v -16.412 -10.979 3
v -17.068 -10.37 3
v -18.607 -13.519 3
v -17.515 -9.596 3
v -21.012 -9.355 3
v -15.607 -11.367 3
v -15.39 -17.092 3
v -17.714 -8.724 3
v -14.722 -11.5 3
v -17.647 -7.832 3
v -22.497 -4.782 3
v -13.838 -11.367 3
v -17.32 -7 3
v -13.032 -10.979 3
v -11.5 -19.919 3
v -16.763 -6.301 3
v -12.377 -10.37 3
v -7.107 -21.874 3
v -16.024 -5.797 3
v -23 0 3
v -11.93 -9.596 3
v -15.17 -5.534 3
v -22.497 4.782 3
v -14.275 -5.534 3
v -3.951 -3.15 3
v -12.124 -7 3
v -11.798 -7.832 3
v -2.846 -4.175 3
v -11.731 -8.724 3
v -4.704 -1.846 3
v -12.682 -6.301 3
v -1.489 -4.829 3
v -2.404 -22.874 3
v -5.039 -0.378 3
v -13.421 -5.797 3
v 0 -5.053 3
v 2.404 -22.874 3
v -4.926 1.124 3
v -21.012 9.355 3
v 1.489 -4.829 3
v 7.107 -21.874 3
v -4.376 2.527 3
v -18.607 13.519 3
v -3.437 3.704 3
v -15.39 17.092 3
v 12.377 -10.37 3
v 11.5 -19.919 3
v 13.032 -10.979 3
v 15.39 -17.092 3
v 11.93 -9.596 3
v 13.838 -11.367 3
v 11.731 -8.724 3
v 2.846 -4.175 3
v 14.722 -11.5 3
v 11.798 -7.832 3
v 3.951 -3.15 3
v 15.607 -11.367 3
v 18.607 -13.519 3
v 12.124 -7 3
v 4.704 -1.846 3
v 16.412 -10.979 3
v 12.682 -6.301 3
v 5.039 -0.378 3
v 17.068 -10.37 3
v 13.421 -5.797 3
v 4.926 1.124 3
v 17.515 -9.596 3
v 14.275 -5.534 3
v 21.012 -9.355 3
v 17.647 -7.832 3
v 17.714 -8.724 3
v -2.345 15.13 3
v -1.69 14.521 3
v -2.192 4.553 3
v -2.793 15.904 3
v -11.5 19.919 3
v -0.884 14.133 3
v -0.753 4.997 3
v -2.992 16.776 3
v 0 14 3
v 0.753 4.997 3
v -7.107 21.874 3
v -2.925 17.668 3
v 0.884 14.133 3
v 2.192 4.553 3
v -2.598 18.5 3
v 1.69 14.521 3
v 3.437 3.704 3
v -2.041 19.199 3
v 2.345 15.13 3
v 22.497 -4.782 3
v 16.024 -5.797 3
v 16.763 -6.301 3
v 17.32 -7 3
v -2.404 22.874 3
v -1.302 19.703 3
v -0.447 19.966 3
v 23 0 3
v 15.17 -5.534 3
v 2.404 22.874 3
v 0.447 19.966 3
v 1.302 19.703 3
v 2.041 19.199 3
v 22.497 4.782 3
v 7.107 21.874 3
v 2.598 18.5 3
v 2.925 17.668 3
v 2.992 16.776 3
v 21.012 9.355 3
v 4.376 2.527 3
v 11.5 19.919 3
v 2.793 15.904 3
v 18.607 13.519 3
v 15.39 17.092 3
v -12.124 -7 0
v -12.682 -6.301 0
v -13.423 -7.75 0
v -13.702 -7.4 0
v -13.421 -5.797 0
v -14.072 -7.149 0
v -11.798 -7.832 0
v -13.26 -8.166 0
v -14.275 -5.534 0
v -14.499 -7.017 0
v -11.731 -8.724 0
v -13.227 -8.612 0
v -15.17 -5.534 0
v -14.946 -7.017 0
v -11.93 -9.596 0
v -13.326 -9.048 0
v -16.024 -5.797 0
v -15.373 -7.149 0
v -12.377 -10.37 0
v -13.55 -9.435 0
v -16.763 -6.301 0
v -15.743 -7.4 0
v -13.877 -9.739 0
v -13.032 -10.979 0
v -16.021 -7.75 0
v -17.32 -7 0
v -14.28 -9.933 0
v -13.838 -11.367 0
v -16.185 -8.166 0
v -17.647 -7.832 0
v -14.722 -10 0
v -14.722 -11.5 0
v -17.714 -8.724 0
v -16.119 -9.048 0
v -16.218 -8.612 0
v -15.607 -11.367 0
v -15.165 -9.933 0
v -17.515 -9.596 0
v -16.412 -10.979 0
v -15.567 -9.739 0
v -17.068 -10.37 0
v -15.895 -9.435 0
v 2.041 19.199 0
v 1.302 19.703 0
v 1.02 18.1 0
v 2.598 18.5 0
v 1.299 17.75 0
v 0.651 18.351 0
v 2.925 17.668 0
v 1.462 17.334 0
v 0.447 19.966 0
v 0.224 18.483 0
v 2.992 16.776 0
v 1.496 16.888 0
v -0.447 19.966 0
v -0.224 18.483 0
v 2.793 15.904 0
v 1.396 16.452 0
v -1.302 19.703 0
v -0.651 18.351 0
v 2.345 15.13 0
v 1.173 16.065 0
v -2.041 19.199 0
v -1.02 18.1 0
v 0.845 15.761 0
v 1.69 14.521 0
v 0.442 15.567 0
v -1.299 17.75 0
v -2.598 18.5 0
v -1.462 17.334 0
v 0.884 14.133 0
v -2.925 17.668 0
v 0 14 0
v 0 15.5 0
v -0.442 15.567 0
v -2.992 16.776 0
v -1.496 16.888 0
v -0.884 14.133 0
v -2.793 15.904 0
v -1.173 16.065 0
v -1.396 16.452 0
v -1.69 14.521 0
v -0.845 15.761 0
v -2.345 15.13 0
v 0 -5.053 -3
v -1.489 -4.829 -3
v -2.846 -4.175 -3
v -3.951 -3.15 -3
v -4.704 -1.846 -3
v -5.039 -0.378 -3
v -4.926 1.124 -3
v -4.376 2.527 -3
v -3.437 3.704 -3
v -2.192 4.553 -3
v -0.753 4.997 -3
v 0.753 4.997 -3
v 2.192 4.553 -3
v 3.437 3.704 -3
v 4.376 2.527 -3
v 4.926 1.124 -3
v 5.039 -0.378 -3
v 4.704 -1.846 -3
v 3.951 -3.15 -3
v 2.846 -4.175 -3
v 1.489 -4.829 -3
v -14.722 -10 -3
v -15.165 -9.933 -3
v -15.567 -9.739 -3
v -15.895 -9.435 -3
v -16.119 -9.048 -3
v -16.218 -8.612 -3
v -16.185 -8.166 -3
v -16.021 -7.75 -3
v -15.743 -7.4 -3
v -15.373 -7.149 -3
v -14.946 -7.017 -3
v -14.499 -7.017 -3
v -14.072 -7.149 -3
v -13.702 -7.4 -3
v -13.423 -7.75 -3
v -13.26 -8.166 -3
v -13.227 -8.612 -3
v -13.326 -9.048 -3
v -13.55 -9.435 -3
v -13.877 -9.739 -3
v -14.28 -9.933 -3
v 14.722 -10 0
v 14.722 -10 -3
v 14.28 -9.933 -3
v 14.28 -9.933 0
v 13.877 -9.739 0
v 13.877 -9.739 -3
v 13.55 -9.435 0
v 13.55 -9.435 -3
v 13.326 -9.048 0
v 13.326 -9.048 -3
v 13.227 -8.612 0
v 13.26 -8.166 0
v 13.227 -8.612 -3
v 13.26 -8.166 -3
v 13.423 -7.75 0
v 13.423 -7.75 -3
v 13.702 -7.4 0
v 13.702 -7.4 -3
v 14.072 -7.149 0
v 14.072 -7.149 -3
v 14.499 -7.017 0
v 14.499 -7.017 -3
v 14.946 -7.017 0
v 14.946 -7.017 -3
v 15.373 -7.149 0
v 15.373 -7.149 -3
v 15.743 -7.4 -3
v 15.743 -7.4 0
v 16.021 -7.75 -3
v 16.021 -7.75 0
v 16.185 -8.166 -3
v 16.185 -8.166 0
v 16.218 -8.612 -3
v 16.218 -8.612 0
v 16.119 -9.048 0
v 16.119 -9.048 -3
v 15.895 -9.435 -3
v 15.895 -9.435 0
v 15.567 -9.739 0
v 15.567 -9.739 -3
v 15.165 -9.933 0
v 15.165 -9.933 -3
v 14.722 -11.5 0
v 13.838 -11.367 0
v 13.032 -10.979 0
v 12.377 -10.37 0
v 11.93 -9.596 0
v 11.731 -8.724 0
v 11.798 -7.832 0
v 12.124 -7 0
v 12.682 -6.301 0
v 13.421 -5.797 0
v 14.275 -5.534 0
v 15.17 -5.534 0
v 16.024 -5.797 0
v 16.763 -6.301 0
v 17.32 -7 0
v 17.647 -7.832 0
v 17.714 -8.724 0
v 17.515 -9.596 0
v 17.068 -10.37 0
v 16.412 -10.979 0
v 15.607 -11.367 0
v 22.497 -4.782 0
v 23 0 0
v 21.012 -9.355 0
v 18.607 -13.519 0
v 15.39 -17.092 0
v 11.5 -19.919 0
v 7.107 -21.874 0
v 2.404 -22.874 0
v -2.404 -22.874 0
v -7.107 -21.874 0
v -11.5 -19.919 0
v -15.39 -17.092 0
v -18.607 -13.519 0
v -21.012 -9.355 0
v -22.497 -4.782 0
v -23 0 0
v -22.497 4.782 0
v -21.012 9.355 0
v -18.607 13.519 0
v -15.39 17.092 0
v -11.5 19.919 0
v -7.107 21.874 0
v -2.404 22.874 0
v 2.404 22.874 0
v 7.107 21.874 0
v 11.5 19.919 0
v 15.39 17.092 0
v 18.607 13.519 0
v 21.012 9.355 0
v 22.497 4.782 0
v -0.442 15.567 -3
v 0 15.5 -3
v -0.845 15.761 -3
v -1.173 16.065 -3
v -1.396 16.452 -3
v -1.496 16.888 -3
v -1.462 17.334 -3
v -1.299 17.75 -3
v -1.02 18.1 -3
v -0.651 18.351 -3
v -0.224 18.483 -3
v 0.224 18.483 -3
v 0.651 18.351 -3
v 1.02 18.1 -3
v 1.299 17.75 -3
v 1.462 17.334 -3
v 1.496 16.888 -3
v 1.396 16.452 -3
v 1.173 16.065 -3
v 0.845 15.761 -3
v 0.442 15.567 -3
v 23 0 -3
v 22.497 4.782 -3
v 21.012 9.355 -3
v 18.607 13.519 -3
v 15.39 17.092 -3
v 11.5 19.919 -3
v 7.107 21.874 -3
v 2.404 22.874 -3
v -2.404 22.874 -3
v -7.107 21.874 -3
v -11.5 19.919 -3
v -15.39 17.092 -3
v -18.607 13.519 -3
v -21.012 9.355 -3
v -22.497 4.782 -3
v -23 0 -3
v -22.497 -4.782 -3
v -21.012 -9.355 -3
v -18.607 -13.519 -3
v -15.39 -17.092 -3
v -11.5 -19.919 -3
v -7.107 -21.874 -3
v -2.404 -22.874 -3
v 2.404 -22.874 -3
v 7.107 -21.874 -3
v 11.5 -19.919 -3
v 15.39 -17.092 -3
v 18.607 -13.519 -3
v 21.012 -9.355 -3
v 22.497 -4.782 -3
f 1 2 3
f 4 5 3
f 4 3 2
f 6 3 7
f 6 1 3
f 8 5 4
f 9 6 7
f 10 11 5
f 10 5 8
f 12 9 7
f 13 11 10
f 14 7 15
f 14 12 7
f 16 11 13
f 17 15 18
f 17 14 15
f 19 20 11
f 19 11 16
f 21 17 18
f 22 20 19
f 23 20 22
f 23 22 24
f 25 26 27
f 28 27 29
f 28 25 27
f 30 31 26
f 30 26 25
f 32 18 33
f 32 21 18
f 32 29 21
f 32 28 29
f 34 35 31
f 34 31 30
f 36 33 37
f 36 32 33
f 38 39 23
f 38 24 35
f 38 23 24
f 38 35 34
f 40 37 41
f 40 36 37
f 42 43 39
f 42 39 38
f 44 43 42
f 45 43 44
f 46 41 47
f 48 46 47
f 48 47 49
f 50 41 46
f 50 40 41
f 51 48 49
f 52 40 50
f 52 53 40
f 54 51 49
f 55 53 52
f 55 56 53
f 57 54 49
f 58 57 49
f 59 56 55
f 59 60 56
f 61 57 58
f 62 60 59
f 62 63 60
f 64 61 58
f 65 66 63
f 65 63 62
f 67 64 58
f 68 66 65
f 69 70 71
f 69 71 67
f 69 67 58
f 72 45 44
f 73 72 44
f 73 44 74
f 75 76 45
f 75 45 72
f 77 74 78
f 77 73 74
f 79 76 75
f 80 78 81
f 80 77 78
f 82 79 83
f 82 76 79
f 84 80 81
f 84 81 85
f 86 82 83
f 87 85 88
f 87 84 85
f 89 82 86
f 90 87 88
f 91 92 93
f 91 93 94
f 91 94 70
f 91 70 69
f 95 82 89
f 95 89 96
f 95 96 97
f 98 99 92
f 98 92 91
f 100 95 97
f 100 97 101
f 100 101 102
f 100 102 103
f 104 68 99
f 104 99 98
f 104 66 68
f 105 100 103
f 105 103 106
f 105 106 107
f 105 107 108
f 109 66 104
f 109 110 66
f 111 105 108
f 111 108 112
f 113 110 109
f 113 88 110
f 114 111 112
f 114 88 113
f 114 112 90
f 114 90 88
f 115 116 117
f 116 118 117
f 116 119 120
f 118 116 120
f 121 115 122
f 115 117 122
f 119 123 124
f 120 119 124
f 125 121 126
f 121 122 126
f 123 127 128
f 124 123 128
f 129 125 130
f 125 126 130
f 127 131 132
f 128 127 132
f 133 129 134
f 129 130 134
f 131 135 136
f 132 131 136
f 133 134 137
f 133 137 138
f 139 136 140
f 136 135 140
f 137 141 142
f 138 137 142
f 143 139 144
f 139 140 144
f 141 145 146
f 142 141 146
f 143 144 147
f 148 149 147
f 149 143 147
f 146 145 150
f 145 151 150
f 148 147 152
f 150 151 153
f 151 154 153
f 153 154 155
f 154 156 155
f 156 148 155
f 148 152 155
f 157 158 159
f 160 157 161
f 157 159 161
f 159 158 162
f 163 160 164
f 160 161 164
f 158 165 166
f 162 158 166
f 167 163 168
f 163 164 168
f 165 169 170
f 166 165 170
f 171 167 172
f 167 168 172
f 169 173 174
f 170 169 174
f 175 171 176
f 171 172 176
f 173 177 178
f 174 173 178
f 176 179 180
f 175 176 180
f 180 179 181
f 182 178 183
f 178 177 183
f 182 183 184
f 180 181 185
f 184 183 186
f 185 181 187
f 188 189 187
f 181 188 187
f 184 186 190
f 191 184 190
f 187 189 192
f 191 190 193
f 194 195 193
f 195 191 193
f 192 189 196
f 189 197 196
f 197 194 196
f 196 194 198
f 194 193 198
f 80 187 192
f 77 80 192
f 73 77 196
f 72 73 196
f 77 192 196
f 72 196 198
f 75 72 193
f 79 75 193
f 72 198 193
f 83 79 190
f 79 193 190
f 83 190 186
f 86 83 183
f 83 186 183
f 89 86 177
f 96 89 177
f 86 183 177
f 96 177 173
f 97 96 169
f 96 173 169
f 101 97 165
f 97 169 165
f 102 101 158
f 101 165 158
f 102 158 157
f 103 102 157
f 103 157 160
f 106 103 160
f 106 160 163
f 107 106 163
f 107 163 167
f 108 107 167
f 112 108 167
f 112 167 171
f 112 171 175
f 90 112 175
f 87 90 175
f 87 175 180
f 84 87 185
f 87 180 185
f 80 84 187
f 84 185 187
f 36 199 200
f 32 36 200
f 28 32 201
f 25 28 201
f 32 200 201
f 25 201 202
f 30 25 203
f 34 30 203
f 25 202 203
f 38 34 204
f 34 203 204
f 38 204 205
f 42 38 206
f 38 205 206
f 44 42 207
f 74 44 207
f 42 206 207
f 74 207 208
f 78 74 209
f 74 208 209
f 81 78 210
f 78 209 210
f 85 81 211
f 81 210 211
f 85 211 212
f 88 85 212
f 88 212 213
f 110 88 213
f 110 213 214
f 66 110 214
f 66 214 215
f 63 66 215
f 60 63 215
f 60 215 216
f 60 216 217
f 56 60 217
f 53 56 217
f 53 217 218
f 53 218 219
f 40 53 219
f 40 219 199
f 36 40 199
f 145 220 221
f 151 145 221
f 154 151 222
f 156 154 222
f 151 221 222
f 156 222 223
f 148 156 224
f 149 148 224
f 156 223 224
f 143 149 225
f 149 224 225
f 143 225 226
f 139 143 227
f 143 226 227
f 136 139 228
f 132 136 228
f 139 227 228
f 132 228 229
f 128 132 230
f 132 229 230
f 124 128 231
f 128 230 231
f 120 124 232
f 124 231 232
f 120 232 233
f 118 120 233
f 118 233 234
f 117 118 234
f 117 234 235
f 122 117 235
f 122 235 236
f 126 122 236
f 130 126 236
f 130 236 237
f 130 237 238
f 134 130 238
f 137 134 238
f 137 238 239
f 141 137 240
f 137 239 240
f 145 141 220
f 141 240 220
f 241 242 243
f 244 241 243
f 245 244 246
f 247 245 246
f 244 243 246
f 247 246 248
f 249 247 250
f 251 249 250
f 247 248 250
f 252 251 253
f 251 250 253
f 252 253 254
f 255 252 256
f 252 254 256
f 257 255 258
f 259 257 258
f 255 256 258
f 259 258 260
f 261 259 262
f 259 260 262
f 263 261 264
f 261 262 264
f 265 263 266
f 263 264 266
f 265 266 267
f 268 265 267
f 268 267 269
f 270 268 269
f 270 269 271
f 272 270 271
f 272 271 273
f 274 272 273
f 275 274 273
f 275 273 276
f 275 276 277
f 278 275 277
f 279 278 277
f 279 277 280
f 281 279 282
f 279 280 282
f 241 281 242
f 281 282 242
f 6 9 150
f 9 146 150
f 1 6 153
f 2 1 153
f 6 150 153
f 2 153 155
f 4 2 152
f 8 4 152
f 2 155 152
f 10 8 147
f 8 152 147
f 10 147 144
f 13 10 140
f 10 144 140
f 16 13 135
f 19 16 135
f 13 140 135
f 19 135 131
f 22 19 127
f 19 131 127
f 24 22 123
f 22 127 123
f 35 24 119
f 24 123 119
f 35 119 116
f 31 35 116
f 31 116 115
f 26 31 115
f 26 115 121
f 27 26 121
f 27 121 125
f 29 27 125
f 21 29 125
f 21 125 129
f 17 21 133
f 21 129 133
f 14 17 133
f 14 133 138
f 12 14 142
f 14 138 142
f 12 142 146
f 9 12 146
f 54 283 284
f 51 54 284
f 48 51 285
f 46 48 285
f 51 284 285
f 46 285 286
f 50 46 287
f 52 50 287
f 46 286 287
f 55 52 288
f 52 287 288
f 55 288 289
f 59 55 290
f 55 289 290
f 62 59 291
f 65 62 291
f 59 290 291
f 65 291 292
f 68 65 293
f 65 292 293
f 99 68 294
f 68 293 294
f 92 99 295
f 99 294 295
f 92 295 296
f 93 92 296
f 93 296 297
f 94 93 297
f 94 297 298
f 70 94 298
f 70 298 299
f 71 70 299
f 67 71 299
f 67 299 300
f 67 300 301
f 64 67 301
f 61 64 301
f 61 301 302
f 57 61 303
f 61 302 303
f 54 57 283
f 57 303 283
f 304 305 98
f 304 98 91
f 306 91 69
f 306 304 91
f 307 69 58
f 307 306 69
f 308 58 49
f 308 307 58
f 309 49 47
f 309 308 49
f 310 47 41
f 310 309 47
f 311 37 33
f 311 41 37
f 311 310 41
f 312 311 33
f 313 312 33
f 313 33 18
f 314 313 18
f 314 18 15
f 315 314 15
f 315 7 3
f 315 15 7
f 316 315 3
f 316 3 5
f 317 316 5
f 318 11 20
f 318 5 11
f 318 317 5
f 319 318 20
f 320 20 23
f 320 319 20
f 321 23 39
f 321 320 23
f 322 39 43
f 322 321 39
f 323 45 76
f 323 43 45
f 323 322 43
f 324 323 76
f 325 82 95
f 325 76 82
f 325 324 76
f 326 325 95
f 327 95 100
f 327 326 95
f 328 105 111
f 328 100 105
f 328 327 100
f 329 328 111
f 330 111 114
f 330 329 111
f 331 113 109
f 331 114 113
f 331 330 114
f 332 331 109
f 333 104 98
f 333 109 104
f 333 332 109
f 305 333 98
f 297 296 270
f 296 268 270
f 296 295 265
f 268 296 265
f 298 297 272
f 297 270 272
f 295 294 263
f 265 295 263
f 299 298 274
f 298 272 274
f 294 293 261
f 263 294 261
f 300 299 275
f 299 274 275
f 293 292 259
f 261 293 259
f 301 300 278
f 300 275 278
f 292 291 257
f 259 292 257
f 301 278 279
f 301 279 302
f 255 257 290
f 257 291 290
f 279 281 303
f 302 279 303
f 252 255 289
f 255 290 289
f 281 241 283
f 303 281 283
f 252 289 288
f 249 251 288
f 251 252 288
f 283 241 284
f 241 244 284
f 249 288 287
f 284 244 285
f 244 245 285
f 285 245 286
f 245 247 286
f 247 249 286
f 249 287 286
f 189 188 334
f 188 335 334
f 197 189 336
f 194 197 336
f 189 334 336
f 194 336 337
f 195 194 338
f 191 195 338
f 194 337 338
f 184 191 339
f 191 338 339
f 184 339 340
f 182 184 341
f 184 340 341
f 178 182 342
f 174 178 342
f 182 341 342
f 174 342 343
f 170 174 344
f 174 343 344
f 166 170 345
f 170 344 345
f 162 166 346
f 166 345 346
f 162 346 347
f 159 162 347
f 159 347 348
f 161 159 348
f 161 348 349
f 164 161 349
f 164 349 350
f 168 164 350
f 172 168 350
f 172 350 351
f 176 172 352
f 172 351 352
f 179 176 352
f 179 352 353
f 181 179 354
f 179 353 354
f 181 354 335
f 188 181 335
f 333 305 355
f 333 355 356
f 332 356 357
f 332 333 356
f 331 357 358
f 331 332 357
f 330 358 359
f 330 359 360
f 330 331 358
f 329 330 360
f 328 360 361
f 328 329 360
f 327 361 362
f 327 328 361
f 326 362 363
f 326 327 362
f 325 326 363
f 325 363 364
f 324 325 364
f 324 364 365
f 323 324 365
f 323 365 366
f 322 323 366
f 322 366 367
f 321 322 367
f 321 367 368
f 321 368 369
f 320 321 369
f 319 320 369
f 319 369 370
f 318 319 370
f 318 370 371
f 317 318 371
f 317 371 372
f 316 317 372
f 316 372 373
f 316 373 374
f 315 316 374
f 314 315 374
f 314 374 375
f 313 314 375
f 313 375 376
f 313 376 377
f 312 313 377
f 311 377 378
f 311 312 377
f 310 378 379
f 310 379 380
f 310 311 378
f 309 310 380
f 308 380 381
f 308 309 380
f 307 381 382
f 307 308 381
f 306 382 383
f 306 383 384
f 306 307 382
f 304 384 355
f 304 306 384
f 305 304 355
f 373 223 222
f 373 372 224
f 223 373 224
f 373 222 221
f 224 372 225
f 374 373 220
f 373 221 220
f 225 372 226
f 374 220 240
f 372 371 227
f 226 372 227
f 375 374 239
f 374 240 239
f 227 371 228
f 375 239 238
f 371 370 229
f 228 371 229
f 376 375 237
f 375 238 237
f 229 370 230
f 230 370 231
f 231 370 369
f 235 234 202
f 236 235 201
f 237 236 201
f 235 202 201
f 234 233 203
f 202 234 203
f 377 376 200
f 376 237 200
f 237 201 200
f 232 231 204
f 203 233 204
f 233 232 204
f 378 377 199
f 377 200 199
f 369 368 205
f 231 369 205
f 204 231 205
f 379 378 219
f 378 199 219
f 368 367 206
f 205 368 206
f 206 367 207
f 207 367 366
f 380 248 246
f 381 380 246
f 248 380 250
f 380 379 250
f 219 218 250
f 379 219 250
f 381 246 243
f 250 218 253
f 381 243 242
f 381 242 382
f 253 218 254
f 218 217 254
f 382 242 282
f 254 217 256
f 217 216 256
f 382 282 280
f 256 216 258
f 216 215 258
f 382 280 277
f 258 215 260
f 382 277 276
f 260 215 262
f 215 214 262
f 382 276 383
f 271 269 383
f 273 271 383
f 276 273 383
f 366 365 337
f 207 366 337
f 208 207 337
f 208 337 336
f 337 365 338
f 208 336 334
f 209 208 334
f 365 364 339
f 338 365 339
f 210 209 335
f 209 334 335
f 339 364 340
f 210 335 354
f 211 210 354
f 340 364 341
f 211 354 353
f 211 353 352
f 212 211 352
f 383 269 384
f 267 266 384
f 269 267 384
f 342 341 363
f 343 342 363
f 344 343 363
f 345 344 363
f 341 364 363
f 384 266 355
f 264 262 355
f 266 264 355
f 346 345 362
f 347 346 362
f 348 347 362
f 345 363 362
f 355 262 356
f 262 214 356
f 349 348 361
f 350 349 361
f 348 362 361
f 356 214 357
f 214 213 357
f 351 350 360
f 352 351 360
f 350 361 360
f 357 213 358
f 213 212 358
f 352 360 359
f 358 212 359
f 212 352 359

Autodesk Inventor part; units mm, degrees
ref_plane "YZ Plane" through (0, 0, 0) normal (1, 0, 0) x (0, 1, 0)
ref_plane "XZ Plane" through (0, 0, 0) normal (0, 1, 0) x (-1, 0, 0)
ref_plane "XY Plane" through (0, 0, 0) normal (0, 0, 1) x (1, 0, 0)
sketch "Sketch1" plane through (0, 0, 0) normal (0, 0, 1) x (1, 0, 0)
  circle A0 centre (0, 0) radius 23
  dimension "d0" = 46
extrude "Extrusion1" add sketch "Sketch1" along normal mid plane 6
sketch "Sketch2" plane through (0, 0, 3) normal (0, 0, 1) x (1, 0, 0)
  circle A0 centre (0, 17) radius 1.5
  circle A1 centre (-14.7224, -8.5) radius 1.5
  circle A2 centre (14.7224, -8.5) radius 1.5
  point P0 (0, 0)
  dimension "d3" = 3
  dimension "d4" = 17
  dimension "d7" = 360
hole "Hole1" at (0, 17, 3) at (-14.7224, -8.5, 3) at (14.7224, -8.5, 3) direction (0, 0, -1) diameter 3 end through all counterbore diameter 6 counterbore depth 3
sketch "Sketch3" plane through (0, 0, 3) normal (0, 0, 1) x (1, 0, 0)
  circle A0 centre (0, 0) radius 6
  dimension "d16" = 12
hole "Hole2" at (0, 0, 3) direction (0, 0, -1) diameter 10.106 depth 6 thread size "M12x1.75" class "6H" standard "ISO Metric profile"
equation "\"d9\" = d3"
properties part number "Gripper_Central_Plate_Base" material "Aluminum 6061"
